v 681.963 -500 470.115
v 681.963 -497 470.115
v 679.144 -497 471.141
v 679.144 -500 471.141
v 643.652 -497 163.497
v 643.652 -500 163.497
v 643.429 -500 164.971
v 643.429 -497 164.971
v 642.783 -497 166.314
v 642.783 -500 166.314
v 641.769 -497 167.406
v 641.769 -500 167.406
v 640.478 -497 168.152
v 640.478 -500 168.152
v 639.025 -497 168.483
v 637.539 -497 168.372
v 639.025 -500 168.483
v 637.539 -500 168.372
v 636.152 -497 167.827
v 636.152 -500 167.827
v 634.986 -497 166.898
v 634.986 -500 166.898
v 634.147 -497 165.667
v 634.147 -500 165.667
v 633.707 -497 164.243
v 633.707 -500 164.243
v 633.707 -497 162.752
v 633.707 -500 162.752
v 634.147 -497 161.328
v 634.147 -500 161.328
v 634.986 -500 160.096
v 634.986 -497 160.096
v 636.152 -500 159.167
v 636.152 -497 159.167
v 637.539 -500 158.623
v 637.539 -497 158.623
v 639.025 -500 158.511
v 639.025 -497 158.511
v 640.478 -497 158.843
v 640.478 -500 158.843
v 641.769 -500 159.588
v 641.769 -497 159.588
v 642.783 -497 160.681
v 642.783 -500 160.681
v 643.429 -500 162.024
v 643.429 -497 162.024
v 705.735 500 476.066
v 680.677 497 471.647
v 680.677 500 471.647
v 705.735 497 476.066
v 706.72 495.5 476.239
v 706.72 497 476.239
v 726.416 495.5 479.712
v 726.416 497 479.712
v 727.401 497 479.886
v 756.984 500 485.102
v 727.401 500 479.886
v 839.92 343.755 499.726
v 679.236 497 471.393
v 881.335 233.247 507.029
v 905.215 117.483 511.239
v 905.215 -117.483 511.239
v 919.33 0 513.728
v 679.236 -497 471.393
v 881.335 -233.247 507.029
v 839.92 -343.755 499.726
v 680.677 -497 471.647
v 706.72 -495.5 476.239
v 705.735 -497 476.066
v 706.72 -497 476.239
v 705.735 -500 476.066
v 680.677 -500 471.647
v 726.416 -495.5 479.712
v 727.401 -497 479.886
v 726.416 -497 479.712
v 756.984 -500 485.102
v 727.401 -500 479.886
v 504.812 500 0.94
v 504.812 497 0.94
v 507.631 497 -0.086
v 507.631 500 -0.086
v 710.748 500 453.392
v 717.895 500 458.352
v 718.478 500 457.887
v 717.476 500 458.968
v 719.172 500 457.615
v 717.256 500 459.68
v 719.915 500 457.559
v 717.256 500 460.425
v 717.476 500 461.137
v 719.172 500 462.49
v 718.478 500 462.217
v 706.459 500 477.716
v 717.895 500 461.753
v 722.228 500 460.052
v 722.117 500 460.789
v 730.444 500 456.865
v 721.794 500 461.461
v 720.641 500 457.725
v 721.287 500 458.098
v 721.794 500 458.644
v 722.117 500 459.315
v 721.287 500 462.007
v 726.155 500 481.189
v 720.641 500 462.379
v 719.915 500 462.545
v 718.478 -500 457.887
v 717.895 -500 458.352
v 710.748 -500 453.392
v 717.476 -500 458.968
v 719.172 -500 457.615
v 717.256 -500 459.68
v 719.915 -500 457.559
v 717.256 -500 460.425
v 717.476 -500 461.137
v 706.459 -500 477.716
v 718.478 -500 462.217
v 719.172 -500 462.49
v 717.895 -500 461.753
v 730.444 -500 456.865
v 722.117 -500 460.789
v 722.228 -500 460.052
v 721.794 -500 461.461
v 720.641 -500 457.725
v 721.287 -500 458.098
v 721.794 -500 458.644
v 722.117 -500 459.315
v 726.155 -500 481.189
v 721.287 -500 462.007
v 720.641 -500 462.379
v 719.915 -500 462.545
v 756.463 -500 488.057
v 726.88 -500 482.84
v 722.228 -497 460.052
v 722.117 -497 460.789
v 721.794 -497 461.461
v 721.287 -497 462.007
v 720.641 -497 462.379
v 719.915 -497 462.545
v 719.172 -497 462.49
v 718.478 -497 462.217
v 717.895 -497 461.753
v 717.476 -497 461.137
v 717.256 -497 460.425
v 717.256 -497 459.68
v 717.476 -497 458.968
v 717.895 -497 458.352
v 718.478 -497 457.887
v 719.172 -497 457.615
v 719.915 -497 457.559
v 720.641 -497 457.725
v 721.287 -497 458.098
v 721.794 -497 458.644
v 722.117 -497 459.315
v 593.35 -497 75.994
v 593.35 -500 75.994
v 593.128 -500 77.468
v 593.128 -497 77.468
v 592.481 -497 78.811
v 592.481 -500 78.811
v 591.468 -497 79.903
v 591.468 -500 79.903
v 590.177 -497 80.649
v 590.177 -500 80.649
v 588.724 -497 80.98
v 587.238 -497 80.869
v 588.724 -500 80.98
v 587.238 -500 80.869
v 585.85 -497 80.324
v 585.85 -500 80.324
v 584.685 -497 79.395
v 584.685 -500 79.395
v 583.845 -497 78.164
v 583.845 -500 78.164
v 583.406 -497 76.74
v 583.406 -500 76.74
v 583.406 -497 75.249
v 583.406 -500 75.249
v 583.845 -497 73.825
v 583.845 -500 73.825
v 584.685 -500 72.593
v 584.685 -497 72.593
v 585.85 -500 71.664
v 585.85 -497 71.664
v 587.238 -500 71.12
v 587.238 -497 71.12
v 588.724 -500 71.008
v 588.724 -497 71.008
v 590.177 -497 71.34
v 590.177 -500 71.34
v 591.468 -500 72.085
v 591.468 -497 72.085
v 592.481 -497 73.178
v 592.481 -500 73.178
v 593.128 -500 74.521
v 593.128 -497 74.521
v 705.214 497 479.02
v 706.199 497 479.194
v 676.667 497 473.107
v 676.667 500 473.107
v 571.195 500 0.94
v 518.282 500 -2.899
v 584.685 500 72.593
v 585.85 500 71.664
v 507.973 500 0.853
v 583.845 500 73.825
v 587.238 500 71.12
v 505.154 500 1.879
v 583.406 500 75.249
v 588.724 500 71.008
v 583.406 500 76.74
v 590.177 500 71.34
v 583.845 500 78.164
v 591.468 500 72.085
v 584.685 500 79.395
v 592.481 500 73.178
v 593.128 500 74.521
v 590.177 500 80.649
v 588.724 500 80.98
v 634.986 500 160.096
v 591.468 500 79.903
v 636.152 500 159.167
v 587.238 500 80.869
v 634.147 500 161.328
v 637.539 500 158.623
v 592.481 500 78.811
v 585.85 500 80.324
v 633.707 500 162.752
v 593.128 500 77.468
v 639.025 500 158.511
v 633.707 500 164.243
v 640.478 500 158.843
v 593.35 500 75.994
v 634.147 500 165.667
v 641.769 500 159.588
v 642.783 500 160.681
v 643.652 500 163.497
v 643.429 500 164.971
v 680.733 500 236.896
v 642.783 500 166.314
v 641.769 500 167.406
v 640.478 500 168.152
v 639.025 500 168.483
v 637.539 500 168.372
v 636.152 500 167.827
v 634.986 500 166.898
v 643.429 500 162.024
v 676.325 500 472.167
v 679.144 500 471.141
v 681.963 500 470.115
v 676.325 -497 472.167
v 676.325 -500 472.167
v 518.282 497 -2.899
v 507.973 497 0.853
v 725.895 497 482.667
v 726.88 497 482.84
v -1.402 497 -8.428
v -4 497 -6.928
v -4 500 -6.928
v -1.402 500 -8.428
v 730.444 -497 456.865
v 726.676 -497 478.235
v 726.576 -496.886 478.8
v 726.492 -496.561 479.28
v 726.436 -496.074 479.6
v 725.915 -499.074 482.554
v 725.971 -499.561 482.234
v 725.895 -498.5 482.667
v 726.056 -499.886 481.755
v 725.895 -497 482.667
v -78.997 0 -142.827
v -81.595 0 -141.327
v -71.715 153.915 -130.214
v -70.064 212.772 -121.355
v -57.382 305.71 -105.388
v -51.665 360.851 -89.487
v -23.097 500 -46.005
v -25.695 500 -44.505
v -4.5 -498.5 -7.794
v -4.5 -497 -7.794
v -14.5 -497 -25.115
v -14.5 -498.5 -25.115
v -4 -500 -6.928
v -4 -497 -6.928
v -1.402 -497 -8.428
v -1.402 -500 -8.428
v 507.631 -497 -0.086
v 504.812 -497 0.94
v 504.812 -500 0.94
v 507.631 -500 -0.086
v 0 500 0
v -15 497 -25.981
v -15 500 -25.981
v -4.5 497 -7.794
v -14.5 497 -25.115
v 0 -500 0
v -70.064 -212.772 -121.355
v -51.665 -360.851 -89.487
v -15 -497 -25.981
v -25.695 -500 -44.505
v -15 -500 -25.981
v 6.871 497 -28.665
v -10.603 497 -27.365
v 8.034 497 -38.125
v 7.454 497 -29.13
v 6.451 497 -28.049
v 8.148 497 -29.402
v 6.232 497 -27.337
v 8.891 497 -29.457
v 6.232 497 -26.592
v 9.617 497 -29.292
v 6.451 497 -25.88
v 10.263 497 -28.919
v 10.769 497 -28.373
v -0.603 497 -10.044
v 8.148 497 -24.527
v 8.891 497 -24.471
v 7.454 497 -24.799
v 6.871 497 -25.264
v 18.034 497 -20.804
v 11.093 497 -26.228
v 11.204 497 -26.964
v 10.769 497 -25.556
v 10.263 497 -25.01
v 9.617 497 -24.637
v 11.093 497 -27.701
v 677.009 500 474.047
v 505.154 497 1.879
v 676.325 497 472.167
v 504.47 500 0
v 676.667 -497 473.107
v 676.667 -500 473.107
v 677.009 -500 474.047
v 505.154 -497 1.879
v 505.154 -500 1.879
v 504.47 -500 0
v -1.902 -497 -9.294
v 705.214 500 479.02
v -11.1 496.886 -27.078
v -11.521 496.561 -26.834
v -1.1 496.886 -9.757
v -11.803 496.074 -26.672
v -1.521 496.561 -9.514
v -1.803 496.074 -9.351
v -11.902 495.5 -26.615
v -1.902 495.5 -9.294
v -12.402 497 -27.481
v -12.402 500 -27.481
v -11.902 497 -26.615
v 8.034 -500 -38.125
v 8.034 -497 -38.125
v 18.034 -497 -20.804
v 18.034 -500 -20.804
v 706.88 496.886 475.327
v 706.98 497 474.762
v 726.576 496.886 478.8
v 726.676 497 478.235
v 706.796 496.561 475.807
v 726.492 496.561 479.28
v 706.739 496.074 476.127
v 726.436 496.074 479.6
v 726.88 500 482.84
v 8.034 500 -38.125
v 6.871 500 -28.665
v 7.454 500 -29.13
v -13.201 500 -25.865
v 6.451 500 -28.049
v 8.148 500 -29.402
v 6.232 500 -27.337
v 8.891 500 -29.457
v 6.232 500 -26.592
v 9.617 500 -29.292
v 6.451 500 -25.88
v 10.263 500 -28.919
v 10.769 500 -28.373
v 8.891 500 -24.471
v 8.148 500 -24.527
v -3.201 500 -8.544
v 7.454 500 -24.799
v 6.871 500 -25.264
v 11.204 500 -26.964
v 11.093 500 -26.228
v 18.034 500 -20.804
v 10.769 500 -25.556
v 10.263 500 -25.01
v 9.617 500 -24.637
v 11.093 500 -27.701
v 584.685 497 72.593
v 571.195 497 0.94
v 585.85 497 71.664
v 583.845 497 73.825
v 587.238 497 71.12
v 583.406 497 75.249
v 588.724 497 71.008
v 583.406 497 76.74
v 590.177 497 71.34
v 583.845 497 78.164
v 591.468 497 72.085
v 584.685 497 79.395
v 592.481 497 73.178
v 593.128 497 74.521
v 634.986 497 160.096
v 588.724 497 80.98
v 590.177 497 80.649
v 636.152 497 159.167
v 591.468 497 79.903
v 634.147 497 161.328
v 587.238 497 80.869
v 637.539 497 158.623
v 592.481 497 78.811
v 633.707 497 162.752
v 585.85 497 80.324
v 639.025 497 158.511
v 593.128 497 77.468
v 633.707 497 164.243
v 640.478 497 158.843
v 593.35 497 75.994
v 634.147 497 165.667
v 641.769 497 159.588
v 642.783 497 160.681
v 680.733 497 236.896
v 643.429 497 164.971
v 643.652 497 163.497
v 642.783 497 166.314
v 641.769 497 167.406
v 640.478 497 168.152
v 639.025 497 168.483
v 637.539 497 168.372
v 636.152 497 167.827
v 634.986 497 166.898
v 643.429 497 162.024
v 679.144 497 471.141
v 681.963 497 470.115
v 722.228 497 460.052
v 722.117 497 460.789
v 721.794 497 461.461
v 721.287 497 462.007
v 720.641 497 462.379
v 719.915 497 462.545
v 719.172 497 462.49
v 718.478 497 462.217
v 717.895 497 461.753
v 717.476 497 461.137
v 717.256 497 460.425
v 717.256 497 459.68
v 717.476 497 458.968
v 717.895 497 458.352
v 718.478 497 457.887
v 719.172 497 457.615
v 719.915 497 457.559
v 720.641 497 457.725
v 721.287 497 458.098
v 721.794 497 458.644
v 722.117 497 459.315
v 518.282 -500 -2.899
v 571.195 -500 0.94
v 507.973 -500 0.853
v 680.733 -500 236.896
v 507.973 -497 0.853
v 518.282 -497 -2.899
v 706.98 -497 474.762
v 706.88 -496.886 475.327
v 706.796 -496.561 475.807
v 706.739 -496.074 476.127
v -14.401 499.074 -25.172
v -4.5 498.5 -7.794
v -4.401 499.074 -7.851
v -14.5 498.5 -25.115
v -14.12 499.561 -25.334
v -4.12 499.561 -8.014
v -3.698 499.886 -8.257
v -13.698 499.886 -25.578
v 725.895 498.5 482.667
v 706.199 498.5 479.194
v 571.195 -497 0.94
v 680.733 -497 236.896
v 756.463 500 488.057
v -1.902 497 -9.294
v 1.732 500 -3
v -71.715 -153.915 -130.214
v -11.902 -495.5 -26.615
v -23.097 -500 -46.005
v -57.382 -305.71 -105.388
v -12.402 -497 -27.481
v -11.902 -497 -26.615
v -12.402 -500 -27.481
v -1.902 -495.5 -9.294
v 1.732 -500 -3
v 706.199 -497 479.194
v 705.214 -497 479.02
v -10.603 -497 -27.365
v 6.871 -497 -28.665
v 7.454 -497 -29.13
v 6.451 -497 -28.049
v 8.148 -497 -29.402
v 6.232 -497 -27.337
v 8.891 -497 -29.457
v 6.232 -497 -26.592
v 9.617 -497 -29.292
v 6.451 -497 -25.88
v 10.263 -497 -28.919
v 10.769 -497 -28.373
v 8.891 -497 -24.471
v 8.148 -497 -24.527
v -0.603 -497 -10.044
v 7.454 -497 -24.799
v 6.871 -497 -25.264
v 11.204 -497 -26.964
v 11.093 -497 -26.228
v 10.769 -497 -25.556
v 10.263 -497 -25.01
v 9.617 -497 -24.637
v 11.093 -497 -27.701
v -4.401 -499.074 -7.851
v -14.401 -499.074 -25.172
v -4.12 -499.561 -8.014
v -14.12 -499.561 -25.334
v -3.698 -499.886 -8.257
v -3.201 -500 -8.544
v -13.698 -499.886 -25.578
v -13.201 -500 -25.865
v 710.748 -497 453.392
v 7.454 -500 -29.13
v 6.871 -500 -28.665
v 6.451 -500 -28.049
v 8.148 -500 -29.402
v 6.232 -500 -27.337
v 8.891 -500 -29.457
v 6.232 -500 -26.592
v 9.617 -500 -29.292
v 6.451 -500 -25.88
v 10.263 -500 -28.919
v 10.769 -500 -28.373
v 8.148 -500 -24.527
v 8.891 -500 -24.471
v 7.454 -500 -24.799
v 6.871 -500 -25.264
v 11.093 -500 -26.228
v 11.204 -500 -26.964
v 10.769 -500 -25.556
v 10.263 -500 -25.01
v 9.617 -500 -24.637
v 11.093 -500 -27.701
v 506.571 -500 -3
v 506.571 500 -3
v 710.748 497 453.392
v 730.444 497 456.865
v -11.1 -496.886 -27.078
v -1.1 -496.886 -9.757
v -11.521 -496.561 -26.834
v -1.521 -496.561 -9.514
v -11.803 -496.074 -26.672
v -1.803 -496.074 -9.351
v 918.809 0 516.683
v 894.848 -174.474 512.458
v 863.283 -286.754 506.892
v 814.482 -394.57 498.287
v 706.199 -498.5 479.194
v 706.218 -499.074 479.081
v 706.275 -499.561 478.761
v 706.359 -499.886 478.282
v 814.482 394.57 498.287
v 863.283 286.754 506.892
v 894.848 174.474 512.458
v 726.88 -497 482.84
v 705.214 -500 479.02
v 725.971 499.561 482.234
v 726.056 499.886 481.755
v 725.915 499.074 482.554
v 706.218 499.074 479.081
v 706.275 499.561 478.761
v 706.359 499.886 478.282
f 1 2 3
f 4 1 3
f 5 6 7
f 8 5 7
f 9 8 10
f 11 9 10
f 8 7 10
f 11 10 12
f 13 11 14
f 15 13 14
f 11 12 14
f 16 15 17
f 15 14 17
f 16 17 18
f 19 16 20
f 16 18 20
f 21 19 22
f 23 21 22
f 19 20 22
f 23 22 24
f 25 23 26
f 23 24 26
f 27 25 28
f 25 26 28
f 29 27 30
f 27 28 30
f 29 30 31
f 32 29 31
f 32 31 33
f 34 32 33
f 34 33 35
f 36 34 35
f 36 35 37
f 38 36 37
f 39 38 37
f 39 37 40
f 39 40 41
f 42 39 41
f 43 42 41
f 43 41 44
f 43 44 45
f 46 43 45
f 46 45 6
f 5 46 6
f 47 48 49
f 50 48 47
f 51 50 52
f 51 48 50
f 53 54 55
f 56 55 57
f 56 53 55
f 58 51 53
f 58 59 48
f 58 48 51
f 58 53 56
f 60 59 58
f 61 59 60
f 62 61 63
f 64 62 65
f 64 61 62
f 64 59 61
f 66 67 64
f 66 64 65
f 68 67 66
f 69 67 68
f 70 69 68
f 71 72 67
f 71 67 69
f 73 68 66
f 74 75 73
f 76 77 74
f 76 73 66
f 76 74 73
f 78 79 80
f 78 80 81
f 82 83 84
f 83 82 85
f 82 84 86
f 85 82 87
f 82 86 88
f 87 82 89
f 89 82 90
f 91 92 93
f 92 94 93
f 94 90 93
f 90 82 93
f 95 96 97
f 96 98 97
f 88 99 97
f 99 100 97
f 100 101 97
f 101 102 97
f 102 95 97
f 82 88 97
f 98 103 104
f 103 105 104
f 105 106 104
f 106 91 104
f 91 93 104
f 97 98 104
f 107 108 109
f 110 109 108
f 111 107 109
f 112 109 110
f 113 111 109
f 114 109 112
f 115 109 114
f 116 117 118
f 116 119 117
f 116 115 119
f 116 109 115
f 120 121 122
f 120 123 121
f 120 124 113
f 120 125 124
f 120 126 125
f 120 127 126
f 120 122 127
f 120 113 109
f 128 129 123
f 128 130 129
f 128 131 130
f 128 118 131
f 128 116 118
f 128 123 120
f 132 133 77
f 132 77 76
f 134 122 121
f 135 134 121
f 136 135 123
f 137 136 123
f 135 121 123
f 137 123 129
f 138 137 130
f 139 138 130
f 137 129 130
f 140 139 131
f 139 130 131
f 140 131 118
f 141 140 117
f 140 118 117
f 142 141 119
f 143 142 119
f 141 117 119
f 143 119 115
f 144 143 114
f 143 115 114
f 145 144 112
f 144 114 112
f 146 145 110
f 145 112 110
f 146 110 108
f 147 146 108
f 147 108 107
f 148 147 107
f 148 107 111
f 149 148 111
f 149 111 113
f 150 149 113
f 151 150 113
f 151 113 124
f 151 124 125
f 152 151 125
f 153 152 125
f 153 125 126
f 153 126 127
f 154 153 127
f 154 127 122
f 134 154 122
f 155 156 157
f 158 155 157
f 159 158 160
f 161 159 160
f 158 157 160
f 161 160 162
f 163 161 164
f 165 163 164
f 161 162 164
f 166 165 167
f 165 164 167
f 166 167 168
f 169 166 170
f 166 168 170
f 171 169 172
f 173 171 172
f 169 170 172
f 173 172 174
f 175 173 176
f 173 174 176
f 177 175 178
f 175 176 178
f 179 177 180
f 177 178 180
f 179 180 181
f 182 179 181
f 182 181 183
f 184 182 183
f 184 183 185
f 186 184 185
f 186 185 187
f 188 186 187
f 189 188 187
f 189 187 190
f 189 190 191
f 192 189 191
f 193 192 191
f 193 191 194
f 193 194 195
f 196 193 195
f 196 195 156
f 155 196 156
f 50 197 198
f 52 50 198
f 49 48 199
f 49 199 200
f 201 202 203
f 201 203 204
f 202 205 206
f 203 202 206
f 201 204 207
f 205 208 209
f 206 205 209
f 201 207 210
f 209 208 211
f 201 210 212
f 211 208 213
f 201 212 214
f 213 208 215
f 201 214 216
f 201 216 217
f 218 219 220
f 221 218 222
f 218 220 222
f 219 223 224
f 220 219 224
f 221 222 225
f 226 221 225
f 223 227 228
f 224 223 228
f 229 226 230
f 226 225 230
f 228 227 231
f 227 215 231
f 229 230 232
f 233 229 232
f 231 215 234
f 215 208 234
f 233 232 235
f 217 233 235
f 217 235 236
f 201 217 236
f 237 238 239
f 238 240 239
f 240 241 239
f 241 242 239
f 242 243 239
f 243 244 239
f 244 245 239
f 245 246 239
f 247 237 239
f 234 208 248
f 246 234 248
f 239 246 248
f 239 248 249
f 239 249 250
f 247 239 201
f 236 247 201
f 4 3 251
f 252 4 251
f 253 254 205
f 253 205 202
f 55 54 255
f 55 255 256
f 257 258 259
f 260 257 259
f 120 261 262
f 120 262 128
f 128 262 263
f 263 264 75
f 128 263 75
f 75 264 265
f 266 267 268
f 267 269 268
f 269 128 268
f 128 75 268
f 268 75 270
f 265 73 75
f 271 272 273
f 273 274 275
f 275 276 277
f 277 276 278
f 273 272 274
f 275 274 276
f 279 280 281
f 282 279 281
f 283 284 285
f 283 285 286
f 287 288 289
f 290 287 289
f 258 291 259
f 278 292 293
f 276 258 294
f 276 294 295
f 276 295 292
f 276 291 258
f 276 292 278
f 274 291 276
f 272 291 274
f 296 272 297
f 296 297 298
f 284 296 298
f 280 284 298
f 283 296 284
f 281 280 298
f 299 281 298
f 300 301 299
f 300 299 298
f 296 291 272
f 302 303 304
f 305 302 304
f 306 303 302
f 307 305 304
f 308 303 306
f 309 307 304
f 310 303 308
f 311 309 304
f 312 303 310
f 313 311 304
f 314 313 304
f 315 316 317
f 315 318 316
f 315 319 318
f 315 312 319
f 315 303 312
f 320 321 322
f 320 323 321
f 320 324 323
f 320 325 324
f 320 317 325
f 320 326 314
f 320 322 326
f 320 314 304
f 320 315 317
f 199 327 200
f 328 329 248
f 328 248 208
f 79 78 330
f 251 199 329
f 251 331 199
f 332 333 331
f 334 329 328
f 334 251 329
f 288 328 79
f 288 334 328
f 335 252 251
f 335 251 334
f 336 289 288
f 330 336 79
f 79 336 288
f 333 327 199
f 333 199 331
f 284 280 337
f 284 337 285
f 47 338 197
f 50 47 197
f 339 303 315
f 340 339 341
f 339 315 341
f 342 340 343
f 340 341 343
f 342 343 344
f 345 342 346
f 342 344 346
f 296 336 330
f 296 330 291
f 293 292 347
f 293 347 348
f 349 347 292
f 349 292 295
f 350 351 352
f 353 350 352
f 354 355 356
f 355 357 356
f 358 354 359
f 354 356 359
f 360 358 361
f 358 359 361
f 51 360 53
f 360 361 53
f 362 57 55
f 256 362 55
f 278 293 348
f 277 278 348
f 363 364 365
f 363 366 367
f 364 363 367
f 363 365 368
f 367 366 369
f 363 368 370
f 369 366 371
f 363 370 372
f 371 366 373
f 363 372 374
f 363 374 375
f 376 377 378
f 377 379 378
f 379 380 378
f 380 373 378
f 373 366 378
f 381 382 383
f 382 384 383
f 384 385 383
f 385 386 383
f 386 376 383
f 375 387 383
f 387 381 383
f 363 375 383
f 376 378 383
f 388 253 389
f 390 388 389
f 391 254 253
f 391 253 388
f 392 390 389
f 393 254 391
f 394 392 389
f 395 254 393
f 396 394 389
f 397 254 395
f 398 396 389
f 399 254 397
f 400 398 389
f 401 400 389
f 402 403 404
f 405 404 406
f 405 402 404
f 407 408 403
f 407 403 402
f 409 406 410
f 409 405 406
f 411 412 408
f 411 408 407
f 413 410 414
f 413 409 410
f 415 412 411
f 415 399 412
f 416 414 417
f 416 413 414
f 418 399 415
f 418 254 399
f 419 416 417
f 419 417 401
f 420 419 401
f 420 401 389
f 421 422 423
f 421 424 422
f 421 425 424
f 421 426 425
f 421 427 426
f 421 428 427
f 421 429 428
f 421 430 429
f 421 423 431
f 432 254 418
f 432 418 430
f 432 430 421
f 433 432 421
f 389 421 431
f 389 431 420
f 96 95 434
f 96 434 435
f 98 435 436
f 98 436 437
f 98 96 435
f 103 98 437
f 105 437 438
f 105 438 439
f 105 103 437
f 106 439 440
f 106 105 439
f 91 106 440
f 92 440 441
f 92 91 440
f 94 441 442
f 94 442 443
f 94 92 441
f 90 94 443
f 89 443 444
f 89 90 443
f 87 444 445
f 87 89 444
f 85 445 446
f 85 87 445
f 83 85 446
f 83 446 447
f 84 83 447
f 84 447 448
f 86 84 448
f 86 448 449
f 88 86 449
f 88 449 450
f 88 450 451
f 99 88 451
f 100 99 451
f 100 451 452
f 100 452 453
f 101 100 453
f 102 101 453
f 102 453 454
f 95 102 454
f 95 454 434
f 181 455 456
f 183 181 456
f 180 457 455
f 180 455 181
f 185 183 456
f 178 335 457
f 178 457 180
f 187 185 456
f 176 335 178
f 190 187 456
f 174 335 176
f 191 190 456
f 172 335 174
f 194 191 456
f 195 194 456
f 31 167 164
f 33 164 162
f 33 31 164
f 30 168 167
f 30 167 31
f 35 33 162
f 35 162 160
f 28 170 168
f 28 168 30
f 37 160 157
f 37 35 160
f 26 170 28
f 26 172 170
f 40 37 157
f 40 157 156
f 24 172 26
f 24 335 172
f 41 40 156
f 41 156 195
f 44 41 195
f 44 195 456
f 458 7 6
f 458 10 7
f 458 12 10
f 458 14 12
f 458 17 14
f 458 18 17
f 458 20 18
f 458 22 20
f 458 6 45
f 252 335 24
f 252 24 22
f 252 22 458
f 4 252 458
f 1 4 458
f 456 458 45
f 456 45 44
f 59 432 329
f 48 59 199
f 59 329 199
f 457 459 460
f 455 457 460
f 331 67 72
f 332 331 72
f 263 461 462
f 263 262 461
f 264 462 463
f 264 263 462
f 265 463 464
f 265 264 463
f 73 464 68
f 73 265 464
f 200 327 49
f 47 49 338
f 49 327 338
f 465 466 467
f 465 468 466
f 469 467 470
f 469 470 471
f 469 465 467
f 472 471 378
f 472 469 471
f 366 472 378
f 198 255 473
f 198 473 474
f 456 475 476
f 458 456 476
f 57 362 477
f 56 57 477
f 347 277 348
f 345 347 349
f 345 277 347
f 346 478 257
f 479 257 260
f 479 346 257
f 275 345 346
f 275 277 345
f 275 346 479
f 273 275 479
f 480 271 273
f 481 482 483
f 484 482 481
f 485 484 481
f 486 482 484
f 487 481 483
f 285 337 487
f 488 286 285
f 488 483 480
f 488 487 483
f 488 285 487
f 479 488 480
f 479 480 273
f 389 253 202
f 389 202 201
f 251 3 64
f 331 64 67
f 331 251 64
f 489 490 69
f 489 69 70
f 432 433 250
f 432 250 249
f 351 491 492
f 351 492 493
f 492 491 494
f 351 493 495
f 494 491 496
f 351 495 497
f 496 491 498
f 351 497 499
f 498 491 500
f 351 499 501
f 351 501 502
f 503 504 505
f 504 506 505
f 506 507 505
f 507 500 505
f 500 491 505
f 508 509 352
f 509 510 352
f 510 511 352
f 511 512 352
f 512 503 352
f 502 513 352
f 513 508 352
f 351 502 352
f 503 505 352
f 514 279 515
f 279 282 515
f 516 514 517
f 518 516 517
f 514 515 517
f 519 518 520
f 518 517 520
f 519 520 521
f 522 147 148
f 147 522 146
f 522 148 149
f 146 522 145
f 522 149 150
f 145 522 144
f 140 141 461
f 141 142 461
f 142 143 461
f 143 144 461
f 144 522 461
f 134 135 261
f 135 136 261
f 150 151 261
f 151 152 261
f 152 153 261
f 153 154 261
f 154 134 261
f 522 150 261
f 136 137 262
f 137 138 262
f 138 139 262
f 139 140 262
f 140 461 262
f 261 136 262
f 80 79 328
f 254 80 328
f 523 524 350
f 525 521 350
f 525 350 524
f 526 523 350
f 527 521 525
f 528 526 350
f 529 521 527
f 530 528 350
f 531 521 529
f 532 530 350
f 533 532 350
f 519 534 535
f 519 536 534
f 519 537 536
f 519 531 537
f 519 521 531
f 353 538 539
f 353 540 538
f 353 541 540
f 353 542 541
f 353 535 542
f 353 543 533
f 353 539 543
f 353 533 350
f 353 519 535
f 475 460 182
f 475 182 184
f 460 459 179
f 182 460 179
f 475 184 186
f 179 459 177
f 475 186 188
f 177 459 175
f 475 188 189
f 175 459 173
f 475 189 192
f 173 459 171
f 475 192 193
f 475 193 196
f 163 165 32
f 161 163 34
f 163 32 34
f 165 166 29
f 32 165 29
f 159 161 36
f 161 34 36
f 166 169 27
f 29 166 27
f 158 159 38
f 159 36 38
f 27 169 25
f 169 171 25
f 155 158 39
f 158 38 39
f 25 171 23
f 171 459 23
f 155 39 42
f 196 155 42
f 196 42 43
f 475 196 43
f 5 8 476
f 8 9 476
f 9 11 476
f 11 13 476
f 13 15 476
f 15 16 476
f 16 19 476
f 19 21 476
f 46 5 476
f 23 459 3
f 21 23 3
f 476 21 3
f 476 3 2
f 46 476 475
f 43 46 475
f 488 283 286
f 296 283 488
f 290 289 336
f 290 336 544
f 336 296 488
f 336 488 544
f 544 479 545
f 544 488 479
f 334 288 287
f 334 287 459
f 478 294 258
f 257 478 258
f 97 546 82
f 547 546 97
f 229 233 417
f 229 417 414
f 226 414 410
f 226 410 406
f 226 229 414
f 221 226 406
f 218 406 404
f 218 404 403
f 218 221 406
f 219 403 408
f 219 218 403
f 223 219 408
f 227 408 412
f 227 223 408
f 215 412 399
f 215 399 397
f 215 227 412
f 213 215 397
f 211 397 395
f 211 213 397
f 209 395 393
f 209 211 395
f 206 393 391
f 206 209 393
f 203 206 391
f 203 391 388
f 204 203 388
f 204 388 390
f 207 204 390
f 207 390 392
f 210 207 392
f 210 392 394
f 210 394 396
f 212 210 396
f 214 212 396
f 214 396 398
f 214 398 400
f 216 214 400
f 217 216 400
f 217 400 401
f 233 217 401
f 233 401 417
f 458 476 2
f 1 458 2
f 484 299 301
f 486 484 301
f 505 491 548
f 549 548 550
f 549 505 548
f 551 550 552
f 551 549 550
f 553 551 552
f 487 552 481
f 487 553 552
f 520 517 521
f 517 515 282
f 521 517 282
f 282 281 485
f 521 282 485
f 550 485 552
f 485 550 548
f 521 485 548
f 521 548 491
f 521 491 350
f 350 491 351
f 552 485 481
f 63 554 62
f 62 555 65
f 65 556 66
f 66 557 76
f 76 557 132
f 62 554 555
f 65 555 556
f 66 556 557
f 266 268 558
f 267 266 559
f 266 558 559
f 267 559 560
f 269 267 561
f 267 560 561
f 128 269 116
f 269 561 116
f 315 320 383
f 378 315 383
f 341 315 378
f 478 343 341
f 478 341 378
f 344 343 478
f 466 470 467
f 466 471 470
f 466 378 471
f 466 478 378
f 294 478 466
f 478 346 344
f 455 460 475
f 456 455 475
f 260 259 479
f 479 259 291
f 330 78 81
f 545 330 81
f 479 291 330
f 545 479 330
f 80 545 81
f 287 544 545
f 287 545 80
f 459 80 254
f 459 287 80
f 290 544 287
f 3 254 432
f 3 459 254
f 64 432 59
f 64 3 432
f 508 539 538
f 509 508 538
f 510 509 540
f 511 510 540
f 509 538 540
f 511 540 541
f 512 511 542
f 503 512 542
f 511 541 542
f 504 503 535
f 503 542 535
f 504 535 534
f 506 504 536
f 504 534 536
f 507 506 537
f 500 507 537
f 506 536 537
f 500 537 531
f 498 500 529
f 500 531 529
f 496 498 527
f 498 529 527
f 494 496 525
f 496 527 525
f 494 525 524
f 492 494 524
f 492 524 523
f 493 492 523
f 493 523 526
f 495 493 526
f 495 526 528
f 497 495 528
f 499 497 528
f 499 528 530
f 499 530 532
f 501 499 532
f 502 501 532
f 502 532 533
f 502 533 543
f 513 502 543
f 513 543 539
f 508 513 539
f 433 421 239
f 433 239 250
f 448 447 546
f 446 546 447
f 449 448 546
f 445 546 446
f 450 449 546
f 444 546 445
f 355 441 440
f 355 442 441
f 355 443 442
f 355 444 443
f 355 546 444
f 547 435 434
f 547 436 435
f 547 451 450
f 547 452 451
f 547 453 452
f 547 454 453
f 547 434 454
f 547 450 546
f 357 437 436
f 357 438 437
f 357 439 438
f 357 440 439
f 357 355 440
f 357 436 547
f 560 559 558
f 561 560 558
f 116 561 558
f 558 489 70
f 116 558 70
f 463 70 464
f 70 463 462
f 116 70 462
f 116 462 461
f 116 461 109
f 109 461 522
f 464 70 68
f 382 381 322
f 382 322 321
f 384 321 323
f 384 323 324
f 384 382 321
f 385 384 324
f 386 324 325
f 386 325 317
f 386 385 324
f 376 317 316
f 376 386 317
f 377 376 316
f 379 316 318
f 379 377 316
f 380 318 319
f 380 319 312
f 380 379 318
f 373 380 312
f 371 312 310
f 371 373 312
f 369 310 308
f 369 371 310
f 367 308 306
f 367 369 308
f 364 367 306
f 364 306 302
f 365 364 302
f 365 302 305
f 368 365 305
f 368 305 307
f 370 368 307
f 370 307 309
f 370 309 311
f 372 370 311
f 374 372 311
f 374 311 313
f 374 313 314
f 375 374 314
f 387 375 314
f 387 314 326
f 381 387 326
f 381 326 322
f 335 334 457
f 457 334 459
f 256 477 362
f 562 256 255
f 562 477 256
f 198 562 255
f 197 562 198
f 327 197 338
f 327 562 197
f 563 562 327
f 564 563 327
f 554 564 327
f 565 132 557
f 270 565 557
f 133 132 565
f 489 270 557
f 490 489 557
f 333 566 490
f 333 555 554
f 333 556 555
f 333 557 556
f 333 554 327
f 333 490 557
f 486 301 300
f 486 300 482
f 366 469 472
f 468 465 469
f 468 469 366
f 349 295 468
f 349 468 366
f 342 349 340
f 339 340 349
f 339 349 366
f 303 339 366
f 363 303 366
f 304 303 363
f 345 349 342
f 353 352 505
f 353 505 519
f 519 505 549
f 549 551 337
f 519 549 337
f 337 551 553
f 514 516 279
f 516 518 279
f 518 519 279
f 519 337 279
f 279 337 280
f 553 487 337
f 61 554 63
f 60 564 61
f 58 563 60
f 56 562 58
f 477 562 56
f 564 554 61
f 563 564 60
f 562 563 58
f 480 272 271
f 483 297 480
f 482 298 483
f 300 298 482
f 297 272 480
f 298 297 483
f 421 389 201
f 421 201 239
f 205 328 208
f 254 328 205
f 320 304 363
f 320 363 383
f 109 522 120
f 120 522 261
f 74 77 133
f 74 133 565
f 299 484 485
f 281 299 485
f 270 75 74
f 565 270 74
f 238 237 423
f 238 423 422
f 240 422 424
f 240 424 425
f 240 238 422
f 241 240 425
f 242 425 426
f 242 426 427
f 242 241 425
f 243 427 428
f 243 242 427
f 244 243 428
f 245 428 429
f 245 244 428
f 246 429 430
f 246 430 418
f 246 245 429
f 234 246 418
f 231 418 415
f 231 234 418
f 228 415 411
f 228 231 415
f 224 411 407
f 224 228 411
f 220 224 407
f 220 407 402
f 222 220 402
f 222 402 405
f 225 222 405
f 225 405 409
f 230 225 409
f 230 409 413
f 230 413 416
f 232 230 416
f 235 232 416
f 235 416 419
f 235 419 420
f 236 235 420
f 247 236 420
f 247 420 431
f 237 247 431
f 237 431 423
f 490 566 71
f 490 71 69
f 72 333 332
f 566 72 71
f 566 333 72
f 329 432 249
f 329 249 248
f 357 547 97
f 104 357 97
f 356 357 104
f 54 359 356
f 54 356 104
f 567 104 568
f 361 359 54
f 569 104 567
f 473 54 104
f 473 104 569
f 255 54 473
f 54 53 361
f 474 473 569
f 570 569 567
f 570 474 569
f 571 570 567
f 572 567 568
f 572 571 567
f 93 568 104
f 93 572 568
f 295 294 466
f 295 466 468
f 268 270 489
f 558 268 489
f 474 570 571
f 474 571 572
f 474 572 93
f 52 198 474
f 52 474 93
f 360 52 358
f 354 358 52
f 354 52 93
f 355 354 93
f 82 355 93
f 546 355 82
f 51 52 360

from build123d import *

# Parameters (mm, degrees)
F1_DEPTH  = 500
F3_DEPTH  = 25
F5_DEPTH  = 25
F6_W      = 3
F6_H      = 22
F7_DEPTH  = 25
F8_W      = 22
F8_H      = 3
F9_DEPTH  = 25
F11_DEPTH = 3
F12_R     = 1.5
F13_R     = 2.5
F14_DEPTH = 25
F16_DEPTH = 3
F17_R     = 1.5
F18_R     = 2.5
F19_DEPTH = 25
F20_W     = 3
F20_H     = 502.47
F21_DEPTH = 25
F23_DEPTH = 3
F24_R     = 5
F25_DEPTH = 25


with BuildPart() as f1:
    # F0 (on Front) → F1 (new body)
    with BuildSketch(Plane.XZ):
        Polygon((504.47, 0), (0, 0), (-81.595, -141.3266856436), (-78.9969237661, -142.8266856566), (1.7320508226, -3.0000000261), (506.5706226329, -3.0000000261), (679.2355833198, 471.3930805921), (919.3296938381, 513.7281501857), (918.8087493006, 516.6825734704), (677.0089017035, 474.0467364079), align=None)
    extrude(amount=F1_DEPTH)

    # F2 (on face) → F3 (cut)
    with BuildSketch(Plane(origin=(0, 0, 0), x_dir=(0, -1, 0), z_dir=(-0.8660254038, 0, 0.5))):
        with BuildLine():
            add(Edge.make_bspline(
                [(0, -163.19), (92.9037991034, -155.737461166), (273.0256641206, -141.2884805339), (425.9509699186, -80.7188457637), (500, -51.39)],
                knots=[0, 0, 0, 0, 0.5157830178, 1, 1, 1, 1], degree=3))
            Line((0, -163.19), (0, -174.6820956469))
            Line((0, -174.6820956469), (528.7734270096, -174.6820956469))
            Line((528.7734270096, -174.6820956469), (528.7734270096, -51.39))
            Line((528.7734270096, -51.39), (500, -51.39))
        make_face()
    extrude(amount=-F3_DEPTH, mode=Mode.SUBTRACT)

    # F4 (on face) → F5 (cut)
    with BuildSketch(Plane(origin=(-60.6524500815, 0, 343.9771374623), x_dir=(0.984807753, 0, 0.1736481777), z_dir=(-0.1736481777, 0, 0.984807753))):
        with BuildLine():
            Line((994.5709671621, -500), (994.5709671621, 0))
            add(Edge.make_bspline(
                [(994.5709671621, 0), (985.1762808521, -87.1032361942), (966.2104639681, -262.9456191283), (875.4987714572, -420.4933030834), (829.7209671621, -500)],
                knots=[0, 0, 0, 0, 0.4953483611, 1, 1, 1, 1], degree=3))
            Line((829.7209671621, -500), (994.5709671621, -500))
        make_face()
    extrude(amount=-F5_DEPTH, mode=Mode.SUBTRACT)

    # F6 (on face) → F7 (cut)
    with BuildSketch(Plane(origin=(0, 0, 0), x_dir=(0, -1, 0), z_dir=(-0.8660254038, 0, 0.5))):
        with Locations((498.5, -19)):
            Rectangle(F6_W, F6_H)
    extrude(amount=-F7_DEPTH, mode=Mode.SUBTRACT)

    # F8 (on face) → F9 (cut)
    with BuildSketch(Plane(origin=(-60.6524500815, 0, 343.9771374623), x_dir=(0.984807753, 0, 0.1736481777), z_dir=(-0.1736481777, 0, 0.984807753))):
        with Locations((788.6809671621, -498.5)):
            Rectangle(F8_W, F8_H)
    extrude(amount=-F9_DEPTH, mode=Mode.SUBTRACT)

    # F10 (on face) → F11 (join)
    with BuildSketch(Plane.XZ.offset(497)):
        Polygon((730.4443408179, 456.8646688183), (725.894758563, 482.6666319473), (706.1986035028, 479.1936683939), (710.7481857577, 453.391705265), align=None)
    extrude(amount=F11_DEPTH)

    # F12
    f12_edges = [f1.edges().sort_by_distance(p)[0] for p in [
        (716.046681, -500, 480.93015),
        (716.567626, -497, 477.975727),
    ]]
    fillet(f12_edges, radius=F12_R)

    # F13 (on face) → F14 (cut)
    with BuildSketch(Plane.XZ.offset(500)):
        with Locations((719.7280223994, 460.0522258067)):
            Circle(F13_R)
    extrude(amount=-F14_DEPTH, mode=Mode.SUBTRACT)

    # F15 (on face) → F16 (join)
    with BuildSketch(Plane.XZ.offset(497)):
        Polygon((-4.5, -7.7942286341), (-14.5, -25.1147367097), (8.0339810065, -38.1247367097), (18.0339810065, -20.8042286341), align=None)
    extrude(amount=F16_DEPTH)

    # F17
    f17_edges = [f1.edges().sort_by_distance(p)[0] for p in [
        (-9.5, -500, -16.454483),
        (-6.901924, -497, -17.954483),
    ]]
    fillet(f17_edges, radius=F17_R)

    # F18 (on face) → F19 (cut)
    with BuildSketch(Plane.XZ.offset(500)):
        with Locations((8.7038539875, -26.9644826719)):
            Circle(F18_R)
    extrude(amount=-F19_DEPTH, mode=Mode.SUBTRACT)

    # F20 (on face) → F21 (cut)
    with BuildSketch(Plane(origin=(445.4582201101, 0, -162.1335327293), x_dir=(0, -1, 0), z_dir=(-0.9396926208, 0, 0.3420201433))):
        with Locations((498.5, 424.7739017035)):
            Rectangle(F20_W, F20_H)
    extrude(amount=-F21_DEPTH, mode=Mode.SUBTRACT)

    # F22 (on face) → F23 (join)
    with BuildSketch(Plane.XZ.offset(497)):
        Polygon((679.1439393037, 471.1412907274), (676.3248614168, 472.1673511663), (505.1540402867, 1.8793852416), (507.9731181735, 0.8533248027), align=None)
        Polygon((681.9630171416, 470.1152303063), (679.1439393037, 471.1412907274), (507.9731181735, 0.8533248027), (518.281546199, -2.8986361607), (571.1954295904, 0.9396926208), (680.732997499, 236.8955152162), align=None)
    extrude(amount=F23_DEPTH)

    # F24 (on face) → F25 (cut)
    with BuildSketch(Plane.XZ.offset(500)):
        with Locations((588.350177503, 75.9943071688)):
            Circle(F24_R)
        with Locations((638.6515103983, 163.4973151683)):
            Circle(F24_R)
    extrude(amount=-F25_DEPTH, mode=Mode.SUBTRACT)

    # F26: F1 across face


with BuildPart() as f1_1:
    add(f1.part)
    add(f1.part.mirror(Plane(origin=(434.4998955086, 0, 160.5222009708), x_dir=(1, 0, 0), z_dir=(0, 1, 0))))


solid = f1_1.part
